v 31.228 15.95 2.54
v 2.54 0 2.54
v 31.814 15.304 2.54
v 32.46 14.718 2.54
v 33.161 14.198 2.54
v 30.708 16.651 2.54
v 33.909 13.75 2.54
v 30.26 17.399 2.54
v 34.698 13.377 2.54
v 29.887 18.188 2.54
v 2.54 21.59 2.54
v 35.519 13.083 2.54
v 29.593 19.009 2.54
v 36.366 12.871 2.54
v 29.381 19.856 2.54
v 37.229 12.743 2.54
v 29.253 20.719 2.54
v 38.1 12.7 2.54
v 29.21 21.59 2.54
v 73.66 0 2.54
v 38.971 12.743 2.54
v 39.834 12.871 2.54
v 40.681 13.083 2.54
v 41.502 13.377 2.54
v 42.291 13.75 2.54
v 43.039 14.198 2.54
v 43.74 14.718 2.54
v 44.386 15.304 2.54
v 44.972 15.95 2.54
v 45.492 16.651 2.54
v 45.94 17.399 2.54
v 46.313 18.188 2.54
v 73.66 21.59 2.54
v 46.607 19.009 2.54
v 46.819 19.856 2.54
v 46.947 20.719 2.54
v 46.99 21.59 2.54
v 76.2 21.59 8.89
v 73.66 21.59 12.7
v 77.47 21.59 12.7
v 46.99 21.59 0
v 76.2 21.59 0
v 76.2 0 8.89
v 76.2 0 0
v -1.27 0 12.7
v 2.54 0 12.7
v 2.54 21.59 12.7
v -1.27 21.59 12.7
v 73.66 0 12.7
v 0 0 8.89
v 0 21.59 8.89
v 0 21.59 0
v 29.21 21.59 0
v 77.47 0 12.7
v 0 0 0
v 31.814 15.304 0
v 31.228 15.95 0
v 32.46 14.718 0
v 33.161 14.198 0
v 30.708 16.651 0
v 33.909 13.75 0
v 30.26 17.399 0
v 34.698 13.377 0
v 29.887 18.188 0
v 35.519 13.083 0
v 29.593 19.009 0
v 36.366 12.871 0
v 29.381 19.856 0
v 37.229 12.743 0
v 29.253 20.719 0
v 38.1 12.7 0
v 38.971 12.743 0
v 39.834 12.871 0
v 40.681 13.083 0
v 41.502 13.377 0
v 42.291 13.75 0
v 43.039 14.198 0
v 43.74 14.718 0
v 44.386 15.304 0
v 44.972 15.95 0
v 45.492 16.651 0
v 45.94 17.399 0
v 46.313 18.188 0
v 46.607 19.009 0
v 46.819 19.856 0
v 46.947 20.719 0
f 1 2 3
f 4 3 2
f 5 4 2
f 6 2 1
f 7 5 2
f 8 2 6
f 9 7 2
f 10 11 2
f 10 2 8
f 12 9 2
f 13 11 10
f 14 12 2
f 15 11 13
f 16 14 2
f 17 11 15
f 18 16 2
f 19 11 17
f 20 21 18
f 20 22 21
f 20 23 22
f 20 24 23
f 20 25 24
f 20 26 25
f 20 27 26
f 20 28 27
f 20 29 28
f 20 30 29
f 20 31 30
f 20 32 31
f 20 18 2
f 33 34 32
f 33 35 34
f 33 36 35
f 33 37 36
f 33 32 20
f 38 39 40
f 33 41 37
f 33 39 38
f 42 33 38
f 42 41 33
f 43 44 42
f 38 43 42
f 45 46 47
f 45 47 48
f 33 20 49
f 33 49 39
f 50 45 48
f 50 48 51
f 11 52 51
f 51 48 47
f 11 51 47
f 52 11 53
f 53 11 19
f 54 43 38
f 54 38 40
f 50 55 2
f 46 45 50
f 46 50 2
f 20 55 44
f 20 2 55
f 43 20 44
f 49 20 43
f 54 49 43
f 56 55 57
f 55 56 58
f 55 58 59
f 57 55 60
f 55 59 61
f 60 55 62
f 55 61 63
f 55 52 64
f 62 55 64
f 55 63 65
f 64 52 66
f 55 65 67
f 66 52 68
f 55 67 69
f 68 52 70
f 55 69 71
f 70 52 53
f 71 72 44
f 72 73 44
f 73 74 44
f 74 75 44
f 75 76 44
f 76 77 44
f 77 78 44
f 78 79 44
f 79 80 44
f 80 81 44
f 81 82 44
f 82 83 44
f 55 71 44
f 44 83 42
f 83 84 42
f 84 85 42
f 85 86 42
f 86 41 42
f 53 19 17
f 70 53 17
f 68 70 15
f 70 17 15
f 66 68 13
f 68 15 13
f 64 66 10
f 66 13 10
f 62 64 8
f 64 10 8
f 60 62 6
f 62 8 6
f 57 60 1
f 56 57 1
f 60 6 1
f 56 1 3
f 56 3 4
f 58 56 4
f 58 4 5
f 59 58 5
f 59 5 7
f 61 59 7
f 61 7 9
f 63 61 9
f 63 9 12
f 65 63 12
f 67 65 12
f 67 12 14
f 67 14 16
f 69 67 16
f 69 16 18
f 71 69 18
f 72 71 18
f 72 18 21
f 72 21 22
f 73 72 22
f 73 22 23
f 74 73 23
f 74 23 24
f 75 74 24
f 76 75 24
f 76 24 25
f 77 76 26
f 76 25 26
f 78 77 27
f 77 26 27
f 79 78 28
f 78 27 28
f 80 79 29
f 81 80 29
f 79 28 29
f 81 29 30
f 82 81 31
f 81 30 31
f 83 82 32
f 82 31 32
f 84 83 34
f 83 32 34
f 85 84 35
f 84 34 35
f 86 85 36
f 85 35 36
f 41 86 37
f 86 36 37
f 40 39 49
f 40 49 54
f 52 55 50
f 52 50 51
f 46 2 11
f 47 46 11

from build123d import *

# Parameters (mm, degrees)
F0_W     = 76.2
F0_H     = 21.59
F1_DEPTH = 2.54
F2_W     = 2.54
F2_H     = 21.59
F3_DEPTH = 10.16
F5_DEPTH = 25.4
F7_DEPTH = 21.59


# Not quite as in the source:
# - a feature names something its author has since deleted; it is built from what else it names


with BuildPart() as f1:
    # F0 (on Top) → F1 (new body)
    with BuildSketch(Plane.XY):
        with Locations((38.1, 10.795)):
            Rectangle(F0_W, F0_H)
    extrude(amount=F1_DEPTH)

    # F2 (on face) → F3 (join)
    with BuildSketch(Plane.XY.offset(2.54)):
        with Locations((1.27, 10.795)):
            Rectangle(F2_W, F2_H)
        with Locations((74.93, 10.795)):
            Rectangle(F2_W, F2_H)
    extrude(amount=F3_DEPTH)

    # F4 (on face) → F5 (cut)
    with BuildSketch(Plane.XY.offset(2.54)):
        with BuildLine():
            ThreePointArc((29.21, 21.59), (38.1, 12.7), (46.99, 21.59))
            Line((46.99, 21.59), (29.21, 21.59))
        make_face()
        with BuildLine():
            Line((29.21, 21.59), (46.99, 21.59))
            ThreePointArc((46.99, 21.59), (38.1, 30.48), (29.21, 21.59))
        make_face()
    extrude(amount=-F5_DEPTH, mode=Mode.SUBTRACT)

    # F6 (on face) → F7 (join, through all)
    with BuildSketch(Plane.XZ):
        Polygon((0, 8.89), (0, 12.7), (-1.27, 12.7), align=None)
        Polygon((76.2, 12.7), (76.2, 8.89), (77.47, 12.7), align=None)
    extrude(amount=-F7_DEPTH)


solid = f1.part
